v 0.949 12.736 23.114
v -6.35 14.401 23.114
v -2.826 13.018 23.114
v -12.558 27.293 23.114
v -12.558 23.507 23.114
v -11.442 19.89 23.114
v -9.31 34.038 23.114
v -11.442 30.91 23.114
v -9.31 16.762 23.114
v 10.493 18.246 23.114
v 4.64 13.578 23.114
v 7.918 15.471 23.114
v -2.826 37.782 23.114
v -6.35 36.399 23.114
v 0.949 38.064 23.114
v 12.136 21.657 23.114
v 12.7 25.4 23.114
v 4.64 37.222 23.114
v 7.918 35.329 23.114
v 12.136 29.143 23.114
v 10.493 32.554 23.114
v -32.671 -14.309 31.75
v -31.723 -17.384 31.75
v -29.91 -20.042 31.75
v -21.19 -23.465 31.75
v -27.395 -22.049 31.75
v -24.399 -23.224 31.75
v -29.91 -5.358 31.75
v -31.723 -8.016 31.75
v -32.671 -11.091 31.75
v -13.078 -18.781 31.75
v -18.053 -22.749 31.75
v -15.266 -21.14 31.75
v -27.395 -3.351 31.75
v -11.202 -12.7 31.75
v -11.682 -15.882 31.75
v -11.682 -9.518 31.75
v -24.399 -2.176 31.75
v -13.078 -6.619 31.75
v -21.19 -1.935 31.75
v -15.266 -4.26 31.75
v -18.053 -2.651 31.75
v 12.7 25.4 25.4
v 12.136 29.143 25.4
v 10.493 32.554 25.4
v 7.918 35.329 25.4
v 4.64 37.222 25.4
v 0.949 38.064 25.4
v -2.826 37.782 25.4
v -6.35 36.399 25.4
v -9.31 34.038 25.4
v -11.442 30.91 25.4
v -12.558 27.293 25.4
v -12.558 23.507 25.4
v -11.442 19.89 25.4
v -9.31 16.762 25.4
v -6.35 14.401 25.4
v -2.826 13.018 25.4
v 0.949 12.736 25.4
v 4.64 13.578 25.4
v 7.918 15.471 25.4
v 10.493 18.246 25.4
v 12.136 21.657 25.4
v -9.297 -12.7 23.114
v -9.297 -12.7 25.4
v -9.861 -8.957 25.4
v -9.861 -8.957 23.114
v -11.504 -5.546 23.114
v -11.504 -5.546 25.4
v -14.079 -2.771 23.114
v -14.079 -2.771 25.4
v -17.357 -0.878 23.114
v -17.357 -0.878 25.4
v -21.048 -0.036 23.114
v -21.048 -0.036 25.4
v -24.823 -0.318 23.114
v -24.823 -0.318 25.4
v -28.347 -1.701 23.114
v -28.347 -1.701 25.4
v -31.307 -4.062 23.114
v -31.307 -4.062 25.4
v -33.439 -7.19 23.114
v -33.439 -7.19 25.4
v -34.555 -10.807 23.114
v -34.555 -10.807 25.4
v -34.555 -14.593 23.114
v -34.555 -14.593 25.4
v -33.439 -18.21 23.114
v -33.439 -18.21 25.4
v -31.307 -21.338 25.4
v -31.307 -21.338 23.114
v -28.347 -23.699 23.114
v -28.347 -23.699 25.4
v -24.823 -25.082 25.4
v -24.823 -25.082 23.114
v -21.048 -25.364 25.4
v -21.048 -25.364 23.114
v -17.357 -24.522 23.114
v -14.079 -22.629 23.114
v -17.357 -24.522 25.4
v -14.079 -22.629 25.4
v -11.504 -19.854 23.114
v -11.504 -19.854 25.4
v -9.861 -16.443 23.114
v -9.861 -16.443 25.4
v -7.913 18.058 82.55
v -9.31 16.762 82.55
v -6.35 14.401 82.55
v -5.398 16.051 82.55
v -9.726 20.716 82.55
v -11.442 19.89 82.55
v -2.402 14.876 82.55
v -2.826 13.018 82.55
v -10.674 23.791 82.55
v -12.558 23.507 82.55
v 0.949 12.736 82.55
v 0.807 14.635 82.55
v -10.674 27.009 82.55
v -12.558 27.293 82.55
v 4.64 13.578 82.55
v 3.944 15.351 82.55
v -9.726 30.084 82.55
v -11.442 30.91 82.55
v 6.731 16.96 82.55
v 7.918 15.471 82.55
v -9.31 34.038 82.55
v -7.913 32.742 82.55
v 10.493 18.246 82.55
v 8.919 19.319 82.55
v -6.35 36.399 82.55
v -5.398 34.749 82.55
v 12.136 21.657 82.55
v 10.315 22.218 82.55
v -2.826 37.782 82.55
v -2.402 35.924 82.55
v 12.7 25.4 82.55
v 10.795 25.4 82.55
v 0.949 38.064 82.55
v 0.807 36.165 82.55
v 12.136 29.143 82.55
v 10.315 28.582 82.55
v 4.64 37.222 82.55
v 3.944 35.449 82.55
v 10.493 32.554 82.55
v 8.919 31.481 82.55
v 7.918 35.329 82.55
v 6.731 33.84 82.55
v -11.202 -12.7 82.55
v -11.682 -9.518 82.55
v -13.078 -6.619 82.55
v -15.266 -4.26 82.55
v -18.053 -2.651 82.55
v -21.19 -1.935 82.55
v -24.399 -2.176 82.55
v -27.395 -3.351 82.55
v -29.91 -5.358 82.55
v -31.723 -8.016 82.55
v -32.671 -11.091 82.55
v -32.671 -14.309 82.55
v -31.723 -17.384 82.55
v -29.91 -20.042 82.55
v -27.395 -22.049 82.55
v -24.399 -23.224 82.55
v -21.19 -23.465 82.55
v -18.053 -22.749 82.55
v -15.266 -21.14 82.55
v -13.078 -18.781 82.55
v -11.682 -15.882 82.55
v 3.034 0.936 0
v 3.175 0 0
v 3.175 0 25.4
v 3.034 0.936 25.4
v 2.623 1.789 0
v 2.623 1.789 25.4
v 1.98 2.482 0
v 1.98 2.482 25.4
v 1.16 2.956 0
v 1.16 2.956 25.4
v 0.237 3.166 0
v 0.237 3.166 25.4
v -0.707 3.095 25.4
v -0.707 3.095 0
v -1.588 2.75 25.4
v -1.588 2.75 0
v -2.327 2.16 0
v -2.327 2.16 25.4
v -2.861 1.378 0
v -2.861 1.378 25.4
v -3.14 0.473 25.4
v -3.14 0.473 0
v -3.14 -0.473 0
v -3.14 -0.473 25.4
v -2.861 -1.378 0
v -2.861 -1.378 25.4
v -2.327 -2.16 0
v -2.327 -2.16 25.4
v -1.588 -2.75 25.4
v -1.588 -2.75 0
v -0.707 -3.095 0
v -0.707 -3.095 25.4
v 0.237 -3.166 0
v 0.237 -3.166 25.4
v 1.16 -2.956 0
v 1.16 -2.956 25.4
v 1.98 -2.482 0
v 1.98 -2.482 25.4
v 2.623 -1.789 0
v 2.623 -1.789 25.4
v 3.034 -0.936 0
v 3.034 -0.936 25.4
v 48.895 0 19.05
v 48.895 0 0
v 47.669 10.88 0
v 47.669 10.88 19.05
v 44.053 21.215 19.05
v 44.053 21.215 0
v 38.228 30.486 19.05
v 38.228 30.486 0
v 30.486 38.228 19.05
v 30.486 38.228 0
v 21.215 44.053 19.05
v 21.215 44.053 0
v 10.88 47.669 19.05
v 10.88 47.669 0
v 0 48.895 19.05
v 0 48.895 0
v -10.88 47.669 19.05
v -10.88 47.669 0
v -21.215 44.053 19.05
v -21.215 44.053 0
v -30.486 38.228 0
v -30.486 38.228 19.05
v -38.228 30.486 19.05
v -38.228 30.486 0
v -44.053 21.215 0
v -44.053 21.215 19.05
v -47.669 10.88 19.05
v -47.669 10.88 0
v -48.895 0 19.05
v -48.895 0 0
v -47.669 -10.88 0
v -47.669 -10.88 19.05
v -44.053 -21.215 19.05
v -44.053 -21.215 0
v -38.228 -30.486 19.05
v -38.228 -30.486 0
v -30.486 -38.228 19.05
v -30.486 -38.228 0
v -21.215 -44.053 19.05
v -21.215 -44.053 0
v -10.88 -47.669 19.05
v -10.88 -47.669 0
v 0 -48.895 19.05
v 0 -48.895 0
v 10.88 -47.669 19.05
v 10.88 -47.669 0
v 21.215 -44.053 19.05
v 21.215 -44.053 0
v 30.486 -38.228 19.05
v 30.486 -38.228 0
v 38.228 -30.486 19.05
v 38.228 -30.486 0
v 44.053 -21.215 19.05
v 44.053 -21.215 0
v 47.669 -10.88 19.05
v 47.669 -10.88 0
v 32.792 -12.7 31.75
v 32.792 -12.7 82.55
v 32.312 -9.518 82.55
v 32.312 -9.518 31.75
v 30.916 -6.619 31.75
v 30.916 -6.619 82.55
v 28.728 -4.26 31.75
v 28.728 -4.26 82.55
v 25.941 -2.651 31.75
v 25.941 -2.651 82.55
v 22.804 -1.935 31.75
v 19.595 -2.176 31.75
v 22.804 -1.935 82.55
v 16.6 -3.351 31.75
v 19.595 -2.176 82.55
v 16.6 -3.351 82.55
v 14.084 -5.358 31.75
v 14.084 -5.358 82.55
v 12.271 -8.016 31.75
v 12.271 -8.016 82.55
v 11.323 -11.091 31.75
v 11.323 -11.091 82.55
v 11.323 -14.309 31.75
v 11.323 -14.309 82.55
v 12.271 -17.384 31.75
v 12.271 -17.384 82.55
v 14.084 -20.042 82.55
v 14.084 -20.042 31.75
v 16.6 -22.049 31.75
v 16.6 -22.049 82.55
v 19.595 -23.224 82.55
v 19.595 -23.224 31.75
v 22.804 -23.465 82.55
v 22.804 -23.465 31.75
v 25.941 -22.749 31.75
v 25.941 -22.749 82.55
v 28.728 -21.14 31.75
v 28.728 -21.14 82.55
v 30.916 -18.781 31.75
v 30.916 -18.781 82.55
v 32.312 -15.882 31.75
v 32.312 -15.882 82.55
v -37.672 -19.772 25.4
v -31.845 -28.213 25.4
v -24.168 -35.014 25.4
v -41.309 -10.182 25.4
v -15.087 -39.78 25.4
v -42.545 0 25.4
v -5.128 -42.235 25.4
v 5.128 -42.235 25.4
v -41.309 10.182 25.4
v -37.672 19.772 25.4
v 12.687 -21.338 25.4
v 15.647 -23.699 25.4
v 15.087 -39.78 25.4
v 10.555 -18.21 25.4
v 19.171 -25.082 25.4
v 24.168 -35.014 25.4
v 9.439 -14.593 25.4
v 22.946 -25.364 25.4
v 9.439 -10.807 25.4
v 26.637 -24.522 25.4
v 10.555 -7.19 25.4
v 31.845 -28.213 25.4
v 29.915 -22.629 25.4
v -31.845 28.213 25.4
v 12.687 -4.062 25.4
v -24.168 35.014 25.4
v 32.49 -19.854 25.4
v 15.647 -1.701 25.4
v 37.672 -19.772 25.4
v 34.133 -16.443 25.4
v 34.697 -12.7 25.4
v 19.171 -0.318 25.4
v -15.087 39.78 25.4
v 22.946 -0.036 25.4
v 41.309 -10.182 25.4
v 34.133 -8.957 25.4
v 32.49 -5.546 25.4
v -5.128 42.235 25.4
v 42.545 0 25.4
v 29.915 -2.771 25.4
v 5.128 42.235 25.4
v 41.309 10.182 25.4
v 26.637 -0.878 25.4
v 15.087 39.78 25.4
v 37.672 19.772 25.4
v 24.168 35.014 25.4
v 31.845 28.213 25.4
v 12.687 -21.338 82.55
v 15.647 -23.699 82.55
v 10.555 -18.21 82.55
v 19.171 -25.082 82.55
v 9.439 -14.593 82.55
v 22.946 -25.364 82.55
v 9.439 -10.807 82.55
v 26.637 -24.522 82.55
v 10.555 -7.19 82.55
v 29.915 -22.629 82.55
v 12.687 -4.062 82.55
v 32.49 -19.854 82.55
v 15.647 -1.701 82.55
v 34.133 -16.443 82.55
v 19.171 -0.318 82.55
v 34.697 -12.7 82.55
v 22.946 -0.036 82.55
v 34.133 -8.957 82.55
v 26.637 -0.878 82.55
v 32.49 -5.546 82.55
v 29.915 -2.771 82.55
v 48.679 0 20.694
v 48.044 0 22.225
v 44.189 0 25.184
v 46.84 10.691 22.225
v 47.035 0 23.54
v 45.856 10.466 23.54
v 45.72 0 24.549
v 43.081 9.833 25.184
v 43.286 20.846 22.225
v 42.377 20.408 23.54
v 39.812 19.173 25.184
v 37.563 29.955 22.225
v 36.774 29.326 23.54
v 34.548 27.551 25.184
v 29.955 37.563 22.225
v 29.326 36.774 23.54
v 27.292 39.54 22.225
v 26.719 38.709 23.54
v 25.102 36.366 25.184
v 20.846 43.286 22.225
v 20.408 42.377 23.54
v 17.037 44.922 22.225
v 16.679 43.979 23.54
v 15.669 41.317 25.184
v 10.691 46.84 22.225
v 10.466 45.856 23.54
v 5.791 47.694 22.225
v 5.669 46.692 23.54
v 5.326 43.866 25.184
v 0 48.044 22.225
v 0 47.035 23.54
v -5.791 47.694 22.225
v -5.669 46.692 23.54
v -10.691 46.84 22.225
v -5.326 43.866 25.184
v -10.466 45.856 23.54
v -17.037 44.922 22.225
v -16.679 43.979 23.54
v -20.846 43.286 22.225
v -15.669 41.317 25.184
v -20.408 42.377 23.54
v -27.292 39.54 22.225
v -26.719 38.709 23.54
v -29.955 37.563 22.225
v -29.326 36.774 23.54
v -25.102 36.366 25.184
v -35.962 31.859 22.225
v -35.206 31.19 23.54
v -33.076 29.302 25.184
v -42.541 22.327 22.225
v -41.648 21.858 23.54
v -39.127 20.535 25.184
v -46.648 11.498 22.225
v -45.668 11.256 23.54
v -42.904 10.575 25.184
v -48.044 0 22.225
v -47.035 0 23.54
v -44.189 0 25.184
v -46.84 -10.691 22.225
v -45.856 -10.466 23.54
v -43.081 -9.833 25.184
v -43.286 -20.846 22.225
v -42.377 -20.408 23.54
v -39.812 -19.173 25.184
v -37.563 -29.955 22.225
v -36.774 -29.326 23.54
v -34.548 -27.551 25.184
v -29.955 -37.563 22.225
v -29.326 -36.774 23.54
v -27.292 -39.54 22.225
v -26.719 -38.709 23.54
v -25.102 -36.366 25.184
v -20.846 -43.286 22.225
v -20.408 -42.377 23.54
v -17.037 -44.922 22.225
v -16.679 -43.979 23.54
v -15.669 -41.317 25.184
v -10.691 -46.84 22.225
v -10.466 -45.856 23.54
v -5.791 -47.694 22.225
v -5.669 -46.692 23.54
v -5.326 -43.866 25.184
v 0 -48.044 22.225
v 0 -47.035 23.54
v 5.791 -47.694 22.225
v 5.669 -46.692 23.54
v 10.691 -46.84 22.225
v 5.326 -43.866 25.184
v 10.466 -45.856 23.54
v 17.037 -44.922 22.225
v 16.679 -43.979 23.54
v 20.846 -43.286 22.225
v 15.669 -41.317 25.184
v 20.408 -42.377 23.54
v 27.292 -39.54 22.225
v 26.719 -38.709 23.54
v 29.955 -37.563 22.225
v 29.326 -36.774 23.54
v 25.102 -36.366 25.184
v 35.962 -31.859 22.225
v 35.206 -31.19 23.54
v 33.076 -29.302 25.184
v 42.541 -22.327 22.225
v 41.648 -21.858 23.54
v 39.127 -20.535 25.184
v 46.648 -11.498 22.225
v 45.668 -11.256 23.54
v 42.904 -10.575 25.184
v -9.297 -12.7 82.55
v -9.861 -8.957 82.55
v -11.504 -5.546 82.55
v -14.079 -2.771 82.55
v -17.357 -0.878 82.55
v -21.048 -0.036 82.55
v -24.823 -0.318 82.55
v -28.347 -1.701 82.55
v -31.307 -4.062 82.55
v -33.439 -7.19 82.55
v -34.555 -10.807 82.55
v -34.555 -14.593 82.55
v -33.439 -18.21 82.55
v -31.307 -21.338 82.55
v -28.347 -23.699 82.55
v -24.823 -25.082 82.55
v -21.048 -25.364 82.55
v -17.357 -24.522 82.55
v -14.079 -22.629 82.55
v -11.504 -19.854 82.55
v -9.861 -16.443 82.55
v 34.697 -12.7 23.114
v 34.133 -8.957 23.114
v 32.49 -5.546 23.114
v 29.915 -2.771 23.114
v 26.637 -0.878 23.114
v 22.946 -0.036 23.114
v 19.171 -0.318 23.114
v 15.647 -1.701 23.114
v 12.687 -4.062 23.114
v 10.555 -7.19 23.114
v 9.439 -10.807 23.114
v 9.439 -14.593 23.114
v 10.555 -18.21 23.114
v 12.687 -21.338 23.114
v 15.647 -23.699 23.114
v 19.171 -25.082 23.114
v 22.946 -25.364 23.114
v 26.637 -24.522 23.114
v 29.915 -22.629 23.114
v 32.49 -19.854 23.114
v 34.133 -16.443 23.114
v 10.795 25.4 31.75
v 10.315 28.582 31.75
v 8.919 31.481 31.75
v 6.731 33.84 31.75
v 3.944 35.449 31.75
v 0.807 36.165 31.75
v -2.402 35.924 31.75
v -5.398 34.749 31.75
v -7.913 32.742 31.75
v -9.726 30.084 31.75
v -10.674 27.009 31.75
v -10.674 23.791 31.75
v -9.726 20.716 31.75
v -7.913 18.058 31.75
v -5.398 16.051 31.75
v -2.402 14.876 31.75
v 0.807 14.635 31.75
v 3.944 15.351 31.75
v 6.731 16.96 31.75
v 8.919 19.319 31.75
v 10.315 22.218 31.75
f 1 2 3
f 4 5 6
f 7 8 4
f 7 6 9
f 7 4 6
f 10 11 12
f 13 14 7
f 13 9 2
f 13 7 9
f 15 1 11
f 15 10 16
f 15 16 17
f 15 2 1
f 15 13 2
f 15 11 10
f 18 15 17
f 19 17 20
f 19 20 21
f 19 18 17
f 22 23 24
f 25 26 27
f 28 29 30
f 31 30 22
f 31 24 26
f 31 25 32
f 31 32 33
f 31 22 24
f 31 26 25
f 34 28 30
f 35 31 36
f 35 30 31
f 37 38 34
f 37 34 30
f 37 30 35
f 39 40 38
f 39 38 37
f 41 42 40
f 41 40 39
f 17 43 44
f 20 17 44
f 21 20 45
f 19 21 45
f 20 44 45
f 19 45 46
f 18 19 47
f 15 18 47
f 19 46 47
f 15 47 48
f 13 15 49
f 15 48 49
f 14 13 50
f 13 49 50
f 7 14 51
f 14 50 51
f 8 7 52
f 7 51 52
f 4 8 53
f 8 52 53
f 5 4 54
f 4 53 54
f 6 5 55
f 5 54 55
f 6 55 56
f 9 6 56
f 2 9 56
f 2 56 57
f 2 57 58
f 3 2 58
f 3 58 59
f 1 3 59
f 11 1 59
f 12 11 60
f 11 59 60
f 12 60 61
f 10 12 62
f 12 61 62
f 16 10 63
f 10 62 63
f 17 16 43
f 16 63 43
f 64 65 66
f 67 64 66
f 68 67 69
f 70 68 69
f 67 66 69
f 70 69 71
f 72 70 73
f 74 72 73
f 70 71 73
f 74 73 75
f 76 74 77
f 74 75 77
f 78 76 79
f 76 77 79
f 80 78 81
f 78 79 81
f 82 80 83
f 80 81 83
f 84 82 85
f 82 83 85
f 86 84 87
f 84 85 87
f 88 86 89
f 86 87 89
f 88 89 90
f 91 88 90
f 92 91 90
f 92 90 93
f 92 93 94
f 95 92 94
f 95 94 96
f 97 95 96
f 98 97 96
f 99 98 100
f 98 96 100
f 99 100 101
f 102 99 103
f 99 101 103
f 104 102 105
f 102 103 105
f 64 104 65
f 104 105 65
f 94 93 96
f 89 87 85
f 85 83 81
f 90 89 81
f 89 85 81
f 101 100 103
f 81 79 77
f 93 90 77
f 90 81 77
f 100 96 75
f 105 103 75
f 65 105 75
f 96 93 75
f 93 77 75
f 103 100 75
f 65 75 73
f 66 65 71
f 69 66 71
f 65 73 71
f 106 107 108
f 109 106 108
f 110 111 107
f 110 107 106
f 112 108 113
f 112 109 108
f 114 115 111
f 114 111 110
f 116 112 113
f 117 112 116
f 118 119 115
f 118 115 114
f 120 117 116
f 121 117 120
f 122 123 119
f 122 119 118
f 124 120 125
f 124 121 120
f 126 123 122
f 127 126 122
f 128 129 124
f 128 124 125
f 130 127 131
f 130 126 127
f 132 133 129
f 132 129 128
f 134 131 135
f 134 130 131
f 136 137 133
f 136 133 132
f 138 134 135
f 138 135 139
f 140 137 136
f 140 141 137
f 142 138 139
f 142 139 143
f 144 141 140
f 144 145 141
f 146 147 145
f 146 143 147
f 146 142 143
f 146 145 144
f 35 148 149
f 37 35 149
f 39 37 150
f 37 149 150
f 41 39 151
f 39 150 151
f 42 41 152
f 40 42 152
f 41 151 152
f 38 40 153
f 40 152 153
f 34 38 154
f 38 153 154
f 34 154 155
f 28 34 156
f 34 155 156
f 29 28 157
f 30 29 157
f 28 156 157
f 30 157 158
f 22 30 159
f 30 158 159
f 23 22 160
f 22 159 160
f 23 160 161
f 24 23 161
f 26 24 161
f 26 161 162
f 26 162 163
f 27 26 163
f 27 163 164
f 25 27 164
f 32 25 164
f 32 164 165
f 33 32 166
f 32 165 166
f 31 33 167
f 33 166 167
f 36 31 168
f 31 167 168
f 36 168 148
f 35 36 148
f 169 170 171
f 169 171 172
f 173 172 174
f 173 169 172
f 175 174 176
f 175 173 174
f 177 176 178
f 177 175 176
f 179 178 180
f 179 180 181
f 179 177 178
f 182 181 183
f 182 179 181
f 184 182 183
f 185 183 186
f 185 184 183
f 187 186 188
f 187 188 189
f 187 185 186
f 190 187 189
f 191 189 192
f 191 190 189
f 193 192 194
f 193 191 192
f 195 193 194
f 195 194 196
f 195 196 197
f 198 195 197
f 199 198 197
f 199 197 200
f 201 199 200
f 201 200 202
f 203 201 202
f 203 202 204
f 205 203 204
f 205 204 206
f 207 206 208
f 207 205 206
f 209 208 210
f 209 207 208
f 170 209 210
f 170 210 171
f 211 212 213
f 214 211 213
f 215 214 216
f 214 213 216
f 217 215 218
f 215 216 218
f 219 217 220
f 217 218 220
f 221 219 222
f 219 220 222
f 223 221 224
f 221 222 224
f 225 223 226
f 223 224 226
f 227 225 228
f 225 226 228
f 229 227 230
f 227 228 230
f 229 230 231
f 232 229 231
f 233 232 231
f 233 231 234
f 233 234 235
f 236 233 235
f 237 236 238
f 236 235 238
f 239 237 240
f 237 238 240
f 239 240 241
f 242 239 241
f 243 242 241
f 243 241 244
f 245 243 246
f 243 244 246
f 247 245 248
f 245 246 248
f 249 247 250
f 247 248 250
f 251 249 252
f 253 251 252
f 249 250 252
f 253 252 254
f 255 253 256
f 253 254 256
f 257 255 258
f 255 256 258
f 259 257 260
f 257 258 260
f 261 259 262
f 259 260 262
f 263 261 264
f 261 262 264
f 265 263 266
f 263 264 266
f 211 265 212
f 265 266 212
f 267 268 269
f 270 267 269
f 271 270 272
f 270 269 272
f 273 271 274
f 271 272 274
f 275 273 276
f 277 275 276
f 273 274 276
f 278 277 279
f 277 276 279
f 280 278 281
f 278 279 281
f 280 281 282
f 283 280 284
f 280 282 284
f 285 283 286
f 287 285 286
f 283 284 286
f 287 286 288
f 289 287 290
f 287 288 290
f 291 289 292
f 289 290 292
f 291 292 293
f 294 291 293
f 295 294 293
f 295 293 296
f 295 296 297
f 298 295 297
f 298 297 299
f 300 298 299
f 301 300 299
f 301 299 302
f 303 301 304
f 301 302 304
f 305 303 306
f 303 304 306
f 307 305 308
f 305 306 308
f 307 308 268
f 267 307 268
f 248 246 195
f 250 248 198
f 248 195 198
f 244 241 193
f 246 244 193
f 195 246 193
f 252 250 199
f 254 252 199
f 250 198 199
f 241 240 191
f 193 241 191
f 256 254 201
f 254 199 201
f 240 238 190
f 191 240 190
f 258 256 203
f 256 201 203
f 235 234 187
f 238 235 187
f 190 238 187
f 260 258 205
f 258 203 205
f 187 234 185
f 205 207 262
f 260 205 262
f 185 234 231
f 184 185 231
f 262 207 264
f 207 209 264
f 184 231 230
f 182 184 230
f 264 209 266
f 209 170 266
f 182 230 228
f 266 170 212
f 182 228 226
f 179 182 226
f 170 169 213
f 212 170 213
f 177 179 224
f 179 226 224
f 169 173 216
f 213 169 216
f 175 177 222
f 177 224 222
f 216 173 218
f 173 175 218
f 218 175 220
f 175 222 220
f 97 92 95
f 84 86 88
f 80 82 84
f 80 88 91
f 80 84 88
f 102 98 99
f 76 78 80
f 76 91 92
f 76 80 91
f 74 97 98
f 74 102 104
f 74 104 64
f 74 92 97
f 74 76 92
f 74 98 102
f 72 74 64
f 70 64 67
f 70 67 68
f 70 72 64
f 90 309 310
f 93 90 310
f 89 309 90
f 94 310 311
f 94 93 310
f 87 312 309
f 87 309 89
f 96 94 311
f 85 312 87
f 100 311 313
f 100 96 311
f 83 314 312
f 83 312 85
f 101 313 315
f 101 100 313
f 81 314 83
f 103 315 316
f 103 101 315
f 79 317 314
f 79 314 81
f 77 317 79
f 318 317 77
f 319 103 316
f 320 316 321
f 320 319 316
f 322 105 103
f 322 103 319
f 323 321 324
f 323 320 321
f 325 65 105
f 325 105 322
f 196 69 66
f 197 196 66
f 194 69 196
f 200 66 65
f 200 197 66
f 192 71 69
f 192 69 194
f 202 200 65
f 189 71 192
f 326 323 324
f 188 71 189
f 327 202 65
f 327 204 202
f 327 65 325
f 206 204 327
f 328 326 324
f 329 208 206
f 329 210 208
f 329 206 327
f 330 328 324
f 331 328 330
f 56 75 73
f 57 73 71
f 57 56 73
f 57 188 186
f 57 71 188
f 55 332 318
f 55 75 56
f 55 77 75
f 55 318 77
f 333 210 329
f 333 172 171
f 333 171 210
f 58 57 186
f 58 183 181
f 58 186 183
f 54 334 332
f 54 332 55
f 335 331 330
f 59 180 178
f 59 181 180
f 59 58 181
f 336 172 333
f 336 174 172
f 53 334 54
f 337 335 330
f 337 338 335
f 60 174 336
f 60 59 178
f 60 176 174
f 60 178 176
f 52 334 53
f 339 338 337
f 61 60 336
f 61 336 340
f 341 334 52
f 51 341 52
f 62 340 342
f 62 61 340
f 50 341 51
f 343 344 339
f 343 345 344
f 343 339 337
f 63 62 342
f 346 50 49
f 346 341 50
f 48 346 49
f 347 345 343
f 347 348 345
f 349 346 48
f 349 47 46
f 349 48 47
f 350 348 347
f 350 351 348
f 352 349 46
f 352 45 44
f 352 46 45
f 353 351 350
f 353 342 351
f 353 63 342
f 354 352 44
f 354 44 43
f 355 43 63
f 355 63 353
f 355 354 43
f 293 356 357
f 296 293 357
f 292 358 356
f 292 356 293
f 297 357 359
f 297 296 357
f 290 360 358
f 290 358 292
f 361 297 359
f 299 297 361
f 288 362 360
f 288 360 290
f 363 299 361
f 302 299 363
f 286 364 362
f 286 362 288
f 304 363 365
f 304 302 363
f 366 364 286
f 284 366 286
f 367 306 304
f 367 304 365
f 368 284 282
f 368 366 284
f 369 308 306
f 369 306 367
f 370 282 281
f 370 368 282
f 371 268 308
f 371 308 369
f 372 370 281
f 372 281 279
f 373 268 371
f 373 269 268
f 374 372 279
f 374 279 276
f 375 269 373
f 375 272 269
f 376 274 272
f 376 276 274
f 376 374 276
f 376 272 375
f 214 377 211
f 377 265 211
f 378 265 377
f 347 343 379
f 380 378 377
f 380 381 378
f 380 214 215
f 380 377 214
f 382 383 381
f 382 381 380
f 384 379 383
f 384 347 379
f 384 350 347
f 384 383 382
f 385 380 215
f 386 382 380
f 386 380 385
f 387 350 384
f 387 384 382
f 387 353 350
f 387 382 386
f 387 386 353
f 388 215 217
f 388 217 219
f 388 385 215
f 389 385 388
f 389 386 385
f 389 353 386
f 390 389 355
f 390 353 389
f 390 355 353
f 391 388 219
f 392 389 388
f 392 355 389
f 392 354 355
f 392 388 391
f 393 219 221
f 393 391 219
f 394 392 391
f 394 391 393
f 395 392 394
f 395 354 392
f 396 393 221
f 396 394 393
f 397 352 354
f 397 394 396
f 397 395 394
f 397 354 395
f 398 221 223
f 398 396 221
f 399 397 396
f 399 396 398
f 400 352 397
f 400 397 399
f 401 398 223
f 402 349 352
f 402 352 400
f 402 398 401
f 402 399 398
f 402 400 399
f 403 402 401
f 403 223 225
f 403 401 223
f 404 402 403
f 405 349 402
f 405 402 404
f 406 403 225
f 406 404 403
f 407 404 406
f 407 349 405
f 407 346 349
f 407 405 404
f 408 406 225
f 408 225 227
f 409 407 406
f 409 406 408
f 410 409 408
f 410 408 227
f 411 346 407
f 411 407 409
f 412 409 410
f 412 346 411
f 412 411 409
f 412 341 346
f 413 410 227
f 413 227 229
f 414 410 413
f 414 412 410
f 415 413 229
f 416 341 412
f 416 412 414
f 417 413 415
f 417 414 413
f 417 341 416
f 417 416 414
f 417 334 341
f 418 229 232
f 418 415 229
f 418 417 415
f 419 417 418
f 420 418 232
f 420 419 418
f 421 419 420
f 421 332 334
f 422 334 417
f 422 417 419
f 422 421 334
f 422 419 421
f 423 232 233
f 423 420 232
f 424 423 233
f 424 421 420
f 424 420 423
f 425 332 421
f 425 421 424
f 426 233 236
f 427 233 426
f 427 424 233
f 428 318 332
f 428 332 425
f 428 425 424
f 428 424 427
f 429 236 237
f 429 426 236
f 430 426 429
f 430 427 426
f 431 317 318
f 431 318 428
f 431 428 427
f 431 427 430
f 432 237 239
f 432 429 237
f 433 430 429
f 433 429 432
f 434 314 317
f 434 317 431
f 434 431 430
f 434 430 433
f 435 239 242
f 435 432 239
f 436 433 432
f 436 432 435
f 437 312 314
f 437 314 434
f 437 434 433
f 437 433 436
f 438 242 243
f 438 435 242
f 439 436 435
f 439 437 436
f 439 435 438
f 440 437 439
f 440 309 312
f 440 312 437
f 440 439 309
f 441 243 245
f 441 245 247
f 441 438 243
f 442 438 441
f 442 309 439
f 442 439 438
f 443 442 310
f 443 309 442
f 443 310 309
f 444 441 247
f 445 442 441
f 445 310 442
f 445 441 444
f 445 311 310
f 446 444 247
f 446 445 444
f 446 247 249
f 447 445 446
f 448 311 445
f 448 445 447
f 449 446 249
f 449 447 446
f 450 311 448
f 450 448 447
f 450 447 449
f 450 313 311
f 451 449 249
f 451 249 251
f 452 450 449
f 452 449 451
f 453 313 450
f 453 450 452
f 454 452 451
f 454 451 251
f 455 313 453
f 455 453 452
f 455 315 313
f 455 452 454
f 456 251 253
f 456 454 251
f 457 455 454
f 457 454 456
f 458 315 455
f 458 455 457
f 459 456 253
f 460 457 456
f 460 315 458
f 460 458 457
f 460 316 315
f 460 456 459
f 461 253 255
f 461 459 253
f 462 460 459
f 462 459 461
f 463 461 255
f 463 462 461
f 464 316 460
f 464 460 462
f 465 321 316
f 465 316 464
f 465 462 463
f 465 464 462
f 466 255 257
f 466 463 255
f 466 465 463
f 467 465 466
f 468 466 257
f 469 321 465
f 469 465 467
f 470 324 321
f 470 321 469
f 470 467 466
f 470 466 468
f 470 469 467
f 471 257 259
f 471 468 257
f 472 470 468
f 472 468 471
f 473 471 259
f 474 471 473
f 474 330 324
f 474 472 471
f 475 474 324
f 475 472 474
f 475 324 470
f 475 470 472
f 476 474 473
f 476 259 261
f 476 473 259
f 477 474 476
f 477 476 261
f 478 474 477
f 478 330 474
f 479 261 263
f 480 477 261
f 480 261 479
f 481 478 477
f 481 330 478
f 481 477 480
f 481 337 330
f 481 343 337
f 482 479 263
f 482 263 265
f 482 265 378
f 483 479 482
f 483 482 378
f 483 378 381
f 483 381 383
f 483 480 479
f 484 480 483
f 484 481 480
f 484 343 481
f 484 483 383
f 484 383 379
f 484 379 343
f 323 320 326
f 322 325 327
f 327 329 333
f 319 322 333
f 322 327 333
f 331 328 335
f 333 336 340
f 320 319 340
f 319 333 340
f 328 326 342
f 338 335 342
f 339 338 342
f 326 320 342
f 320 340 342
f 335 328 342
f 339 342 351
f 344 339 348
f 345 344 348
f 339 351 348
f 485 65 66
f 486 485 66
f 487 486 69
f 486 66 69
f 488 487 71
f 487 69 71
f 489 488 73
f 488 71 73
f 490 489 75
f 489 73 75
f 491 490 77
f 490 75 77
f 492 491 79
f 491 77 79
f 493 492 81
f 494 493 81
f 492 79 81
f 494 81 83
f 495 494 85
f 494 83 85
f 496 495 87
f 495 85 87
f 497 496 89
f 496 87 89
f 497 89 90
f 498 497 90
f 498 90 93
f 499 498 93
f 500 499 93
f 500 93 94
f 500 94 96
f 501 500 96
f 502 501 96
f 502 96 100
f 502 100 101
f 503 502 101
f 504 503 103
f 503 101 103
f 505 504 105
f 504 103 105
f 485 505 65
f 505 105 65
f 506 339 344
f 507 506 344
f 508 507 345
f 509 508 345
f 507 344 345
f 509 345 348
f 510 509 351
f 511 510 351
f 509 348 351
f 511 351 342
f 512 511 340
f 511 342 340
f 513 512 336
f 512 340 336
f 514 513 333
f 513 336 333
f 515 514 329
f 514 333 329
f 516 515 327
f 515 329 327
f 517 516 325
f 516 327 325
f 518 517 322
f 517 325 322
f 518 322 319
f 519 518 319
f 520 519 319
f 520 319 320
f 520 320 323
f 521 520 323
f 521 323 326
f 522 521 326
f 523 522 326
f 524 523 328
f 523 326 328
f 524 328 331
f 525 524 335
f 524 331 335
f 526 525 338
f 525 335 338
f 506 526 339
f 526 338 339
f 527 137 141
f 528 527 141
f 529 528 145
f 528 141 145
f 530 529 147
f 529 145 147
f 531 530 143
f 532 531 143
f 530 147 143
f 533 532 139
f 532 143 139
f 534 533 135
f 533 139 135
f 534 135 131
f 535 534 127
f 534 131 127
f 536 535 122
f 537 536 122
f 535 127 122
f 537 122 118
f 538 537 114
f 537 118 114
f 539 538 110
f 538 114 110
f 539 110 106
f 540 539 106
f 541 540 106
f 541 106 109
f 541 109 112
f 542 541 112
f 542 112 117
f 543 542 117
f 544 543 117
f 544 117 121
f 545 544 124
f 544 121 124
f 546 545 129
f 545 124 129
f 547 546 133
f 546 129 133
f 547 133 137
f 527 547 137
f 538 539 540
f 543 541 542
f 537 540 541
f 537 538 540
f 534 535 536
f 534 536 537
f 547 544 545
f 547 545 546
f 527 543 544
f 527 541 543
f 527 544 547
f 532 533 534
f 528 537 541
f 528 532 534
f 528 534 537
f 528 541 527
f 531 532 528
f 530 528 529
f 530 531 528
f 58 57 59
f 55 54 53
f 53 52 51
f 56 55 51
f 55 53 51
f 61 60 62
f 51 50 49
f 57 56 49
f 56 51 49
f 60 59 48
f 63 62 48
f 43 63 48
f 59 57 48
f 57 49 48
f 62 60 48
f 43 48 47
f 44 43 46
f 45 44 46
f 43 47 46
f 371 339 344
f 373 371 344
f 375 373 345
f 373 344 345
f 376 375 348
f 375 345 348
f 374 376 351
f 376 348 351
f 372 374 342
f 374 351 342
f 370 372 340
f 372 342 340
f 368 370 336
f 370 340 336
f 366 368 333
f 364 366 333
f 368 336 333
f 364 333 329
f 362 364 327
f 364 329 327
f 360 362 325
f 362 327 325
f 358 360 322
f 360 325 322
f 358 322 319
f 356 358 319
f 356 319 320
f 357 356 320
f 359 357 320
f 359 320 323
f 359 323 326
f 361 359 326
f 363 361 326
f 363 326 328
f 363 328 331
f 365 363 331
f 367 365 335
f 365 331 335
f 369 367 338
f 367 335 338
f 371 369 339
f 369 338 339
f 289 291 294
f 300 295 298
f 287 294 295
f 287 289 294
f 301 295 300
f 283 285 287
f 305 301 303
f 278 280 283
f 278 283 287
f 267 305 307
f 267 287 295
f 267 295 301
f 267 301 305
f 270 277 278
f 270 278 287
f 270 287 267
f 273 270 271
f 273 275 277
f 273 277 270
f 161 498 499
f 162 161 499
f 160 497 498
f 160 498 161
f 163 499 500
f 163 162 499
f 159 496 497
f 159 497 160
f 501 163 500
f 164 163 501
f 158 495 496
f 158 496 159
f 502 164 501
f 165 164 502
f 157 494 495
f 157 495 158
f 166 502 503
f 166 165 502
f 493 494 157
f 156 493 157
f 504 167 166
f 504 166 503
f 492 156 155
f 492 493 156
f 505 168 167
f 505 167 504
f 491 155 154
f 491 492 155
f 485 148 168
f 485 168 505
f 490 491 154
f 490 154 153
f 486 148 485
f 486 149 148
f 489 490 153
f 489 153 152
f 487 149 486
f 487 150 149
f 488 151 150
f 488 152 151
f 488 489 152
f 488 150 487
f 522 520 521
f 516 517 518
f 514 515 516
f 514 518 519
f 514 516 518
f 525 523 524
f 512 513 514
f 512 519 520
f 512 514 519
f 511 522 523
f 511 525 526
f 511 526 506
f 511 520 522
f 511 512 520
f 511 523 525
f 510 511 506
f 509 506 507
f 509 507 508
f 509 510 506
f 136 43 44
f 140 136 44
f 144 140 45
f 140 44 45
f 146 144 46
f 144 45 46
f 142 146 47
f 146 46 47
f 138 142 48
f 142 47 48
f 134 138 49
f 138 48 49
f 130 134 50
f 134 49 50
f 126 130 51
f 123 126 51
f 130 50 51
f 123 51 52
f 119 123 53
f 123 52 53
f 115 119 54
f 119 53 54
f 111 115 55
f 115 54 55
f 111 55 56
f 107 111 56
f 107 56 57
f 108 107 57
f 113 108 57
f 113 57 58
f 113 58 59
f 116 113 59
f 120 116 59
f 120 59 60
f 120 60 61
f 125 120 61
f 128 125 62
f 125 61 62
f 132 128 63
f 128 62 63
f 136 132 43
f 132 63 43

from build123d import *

# Parameters (mm, degrees)
F0_R      = 48.895
F0_R_2    = 3.175
F1_DEPTH  = 25.4
F2_R      = 6.35
F3_R      = 12.7
F4_DEPTH  = 57.15
F5_R      = 10.795
F6_DEPTH  = 50.8
F7_R      = 10.795
F8_DEPTH  = 50.8
F9_R      = 10.795
F10_DEPTH = 50.8
F11_DEPTH = 2.286


with BuildPart() as f1:
    # F0 (on Top) → F1 (new body)
    with BuildSketch(Plane.XY):
        Circle(F0_R)
        Circle(F0_R_2, mode=Mode.SUBTRACT)
    extrude(amount=F1_DEPTH)

    # F2
    f2_edges = [f1.edges().sort_by_distance(p)[0] for p in [
        (-48.895, 0, 25.4),
    ]]
    fillet(f2_edges, radius=F2_R)

    # F3 (on face) → F4 (join)
    with BuildSketch(Plane.XY.offset(25.4)):
        with Locations((0, 25.4)):
            Circle(F3_R)
        with Locations((-21.997045, -12.7)):
            Circle(F3_R)
        with Locations((21.997045, -12.7)):
            Circle(F3_R)
    extrude(amount=F4_DEPTH)

    # F5 (on face) → F6 (cut)
    with BuildSketch(Plane.XY.offset(82.55)):
        with Locations((21.997045, -12.7)):
            Circle(F5_R)
    extrude(amount=-F6_DEPTH, mode=Mode.SUBTRACT)

    # F7 (on face) → F8 (cut)
    with BuildSketch(Plane.XY.offset(82.55)):
        with Locations((-21.997045, -12.7)):
            Circle(F7_R)
    extrude(amount=-F8_DEPTH, mode=Mode.SUBTRACT)

    # F9 (on face) → F10 (cut)
    with BuildSketch(Plane.XY.offset(82.55)):
        with Locations((0, 25.4)):
            Circle(F9_R)
    extrude(amount=-F10_DEPTH, mode=Mode.SUBTRACT)

    # F3 (on face) → F11 (cut)
    with BuildSketch(Plane.XY.offset(25.4)):
        with Locations((0, 25.4)):
            Circle(F3_R)
        with Locations((-21.997045, -12.7)):
            Circle(F3_R)
        with Locations((21.997045, -12.7)):
            Circle(F3_R)
    extrude(amount=-F11_DEPTH, mode=Mode.SUBTRACT)


solid = f1.part
